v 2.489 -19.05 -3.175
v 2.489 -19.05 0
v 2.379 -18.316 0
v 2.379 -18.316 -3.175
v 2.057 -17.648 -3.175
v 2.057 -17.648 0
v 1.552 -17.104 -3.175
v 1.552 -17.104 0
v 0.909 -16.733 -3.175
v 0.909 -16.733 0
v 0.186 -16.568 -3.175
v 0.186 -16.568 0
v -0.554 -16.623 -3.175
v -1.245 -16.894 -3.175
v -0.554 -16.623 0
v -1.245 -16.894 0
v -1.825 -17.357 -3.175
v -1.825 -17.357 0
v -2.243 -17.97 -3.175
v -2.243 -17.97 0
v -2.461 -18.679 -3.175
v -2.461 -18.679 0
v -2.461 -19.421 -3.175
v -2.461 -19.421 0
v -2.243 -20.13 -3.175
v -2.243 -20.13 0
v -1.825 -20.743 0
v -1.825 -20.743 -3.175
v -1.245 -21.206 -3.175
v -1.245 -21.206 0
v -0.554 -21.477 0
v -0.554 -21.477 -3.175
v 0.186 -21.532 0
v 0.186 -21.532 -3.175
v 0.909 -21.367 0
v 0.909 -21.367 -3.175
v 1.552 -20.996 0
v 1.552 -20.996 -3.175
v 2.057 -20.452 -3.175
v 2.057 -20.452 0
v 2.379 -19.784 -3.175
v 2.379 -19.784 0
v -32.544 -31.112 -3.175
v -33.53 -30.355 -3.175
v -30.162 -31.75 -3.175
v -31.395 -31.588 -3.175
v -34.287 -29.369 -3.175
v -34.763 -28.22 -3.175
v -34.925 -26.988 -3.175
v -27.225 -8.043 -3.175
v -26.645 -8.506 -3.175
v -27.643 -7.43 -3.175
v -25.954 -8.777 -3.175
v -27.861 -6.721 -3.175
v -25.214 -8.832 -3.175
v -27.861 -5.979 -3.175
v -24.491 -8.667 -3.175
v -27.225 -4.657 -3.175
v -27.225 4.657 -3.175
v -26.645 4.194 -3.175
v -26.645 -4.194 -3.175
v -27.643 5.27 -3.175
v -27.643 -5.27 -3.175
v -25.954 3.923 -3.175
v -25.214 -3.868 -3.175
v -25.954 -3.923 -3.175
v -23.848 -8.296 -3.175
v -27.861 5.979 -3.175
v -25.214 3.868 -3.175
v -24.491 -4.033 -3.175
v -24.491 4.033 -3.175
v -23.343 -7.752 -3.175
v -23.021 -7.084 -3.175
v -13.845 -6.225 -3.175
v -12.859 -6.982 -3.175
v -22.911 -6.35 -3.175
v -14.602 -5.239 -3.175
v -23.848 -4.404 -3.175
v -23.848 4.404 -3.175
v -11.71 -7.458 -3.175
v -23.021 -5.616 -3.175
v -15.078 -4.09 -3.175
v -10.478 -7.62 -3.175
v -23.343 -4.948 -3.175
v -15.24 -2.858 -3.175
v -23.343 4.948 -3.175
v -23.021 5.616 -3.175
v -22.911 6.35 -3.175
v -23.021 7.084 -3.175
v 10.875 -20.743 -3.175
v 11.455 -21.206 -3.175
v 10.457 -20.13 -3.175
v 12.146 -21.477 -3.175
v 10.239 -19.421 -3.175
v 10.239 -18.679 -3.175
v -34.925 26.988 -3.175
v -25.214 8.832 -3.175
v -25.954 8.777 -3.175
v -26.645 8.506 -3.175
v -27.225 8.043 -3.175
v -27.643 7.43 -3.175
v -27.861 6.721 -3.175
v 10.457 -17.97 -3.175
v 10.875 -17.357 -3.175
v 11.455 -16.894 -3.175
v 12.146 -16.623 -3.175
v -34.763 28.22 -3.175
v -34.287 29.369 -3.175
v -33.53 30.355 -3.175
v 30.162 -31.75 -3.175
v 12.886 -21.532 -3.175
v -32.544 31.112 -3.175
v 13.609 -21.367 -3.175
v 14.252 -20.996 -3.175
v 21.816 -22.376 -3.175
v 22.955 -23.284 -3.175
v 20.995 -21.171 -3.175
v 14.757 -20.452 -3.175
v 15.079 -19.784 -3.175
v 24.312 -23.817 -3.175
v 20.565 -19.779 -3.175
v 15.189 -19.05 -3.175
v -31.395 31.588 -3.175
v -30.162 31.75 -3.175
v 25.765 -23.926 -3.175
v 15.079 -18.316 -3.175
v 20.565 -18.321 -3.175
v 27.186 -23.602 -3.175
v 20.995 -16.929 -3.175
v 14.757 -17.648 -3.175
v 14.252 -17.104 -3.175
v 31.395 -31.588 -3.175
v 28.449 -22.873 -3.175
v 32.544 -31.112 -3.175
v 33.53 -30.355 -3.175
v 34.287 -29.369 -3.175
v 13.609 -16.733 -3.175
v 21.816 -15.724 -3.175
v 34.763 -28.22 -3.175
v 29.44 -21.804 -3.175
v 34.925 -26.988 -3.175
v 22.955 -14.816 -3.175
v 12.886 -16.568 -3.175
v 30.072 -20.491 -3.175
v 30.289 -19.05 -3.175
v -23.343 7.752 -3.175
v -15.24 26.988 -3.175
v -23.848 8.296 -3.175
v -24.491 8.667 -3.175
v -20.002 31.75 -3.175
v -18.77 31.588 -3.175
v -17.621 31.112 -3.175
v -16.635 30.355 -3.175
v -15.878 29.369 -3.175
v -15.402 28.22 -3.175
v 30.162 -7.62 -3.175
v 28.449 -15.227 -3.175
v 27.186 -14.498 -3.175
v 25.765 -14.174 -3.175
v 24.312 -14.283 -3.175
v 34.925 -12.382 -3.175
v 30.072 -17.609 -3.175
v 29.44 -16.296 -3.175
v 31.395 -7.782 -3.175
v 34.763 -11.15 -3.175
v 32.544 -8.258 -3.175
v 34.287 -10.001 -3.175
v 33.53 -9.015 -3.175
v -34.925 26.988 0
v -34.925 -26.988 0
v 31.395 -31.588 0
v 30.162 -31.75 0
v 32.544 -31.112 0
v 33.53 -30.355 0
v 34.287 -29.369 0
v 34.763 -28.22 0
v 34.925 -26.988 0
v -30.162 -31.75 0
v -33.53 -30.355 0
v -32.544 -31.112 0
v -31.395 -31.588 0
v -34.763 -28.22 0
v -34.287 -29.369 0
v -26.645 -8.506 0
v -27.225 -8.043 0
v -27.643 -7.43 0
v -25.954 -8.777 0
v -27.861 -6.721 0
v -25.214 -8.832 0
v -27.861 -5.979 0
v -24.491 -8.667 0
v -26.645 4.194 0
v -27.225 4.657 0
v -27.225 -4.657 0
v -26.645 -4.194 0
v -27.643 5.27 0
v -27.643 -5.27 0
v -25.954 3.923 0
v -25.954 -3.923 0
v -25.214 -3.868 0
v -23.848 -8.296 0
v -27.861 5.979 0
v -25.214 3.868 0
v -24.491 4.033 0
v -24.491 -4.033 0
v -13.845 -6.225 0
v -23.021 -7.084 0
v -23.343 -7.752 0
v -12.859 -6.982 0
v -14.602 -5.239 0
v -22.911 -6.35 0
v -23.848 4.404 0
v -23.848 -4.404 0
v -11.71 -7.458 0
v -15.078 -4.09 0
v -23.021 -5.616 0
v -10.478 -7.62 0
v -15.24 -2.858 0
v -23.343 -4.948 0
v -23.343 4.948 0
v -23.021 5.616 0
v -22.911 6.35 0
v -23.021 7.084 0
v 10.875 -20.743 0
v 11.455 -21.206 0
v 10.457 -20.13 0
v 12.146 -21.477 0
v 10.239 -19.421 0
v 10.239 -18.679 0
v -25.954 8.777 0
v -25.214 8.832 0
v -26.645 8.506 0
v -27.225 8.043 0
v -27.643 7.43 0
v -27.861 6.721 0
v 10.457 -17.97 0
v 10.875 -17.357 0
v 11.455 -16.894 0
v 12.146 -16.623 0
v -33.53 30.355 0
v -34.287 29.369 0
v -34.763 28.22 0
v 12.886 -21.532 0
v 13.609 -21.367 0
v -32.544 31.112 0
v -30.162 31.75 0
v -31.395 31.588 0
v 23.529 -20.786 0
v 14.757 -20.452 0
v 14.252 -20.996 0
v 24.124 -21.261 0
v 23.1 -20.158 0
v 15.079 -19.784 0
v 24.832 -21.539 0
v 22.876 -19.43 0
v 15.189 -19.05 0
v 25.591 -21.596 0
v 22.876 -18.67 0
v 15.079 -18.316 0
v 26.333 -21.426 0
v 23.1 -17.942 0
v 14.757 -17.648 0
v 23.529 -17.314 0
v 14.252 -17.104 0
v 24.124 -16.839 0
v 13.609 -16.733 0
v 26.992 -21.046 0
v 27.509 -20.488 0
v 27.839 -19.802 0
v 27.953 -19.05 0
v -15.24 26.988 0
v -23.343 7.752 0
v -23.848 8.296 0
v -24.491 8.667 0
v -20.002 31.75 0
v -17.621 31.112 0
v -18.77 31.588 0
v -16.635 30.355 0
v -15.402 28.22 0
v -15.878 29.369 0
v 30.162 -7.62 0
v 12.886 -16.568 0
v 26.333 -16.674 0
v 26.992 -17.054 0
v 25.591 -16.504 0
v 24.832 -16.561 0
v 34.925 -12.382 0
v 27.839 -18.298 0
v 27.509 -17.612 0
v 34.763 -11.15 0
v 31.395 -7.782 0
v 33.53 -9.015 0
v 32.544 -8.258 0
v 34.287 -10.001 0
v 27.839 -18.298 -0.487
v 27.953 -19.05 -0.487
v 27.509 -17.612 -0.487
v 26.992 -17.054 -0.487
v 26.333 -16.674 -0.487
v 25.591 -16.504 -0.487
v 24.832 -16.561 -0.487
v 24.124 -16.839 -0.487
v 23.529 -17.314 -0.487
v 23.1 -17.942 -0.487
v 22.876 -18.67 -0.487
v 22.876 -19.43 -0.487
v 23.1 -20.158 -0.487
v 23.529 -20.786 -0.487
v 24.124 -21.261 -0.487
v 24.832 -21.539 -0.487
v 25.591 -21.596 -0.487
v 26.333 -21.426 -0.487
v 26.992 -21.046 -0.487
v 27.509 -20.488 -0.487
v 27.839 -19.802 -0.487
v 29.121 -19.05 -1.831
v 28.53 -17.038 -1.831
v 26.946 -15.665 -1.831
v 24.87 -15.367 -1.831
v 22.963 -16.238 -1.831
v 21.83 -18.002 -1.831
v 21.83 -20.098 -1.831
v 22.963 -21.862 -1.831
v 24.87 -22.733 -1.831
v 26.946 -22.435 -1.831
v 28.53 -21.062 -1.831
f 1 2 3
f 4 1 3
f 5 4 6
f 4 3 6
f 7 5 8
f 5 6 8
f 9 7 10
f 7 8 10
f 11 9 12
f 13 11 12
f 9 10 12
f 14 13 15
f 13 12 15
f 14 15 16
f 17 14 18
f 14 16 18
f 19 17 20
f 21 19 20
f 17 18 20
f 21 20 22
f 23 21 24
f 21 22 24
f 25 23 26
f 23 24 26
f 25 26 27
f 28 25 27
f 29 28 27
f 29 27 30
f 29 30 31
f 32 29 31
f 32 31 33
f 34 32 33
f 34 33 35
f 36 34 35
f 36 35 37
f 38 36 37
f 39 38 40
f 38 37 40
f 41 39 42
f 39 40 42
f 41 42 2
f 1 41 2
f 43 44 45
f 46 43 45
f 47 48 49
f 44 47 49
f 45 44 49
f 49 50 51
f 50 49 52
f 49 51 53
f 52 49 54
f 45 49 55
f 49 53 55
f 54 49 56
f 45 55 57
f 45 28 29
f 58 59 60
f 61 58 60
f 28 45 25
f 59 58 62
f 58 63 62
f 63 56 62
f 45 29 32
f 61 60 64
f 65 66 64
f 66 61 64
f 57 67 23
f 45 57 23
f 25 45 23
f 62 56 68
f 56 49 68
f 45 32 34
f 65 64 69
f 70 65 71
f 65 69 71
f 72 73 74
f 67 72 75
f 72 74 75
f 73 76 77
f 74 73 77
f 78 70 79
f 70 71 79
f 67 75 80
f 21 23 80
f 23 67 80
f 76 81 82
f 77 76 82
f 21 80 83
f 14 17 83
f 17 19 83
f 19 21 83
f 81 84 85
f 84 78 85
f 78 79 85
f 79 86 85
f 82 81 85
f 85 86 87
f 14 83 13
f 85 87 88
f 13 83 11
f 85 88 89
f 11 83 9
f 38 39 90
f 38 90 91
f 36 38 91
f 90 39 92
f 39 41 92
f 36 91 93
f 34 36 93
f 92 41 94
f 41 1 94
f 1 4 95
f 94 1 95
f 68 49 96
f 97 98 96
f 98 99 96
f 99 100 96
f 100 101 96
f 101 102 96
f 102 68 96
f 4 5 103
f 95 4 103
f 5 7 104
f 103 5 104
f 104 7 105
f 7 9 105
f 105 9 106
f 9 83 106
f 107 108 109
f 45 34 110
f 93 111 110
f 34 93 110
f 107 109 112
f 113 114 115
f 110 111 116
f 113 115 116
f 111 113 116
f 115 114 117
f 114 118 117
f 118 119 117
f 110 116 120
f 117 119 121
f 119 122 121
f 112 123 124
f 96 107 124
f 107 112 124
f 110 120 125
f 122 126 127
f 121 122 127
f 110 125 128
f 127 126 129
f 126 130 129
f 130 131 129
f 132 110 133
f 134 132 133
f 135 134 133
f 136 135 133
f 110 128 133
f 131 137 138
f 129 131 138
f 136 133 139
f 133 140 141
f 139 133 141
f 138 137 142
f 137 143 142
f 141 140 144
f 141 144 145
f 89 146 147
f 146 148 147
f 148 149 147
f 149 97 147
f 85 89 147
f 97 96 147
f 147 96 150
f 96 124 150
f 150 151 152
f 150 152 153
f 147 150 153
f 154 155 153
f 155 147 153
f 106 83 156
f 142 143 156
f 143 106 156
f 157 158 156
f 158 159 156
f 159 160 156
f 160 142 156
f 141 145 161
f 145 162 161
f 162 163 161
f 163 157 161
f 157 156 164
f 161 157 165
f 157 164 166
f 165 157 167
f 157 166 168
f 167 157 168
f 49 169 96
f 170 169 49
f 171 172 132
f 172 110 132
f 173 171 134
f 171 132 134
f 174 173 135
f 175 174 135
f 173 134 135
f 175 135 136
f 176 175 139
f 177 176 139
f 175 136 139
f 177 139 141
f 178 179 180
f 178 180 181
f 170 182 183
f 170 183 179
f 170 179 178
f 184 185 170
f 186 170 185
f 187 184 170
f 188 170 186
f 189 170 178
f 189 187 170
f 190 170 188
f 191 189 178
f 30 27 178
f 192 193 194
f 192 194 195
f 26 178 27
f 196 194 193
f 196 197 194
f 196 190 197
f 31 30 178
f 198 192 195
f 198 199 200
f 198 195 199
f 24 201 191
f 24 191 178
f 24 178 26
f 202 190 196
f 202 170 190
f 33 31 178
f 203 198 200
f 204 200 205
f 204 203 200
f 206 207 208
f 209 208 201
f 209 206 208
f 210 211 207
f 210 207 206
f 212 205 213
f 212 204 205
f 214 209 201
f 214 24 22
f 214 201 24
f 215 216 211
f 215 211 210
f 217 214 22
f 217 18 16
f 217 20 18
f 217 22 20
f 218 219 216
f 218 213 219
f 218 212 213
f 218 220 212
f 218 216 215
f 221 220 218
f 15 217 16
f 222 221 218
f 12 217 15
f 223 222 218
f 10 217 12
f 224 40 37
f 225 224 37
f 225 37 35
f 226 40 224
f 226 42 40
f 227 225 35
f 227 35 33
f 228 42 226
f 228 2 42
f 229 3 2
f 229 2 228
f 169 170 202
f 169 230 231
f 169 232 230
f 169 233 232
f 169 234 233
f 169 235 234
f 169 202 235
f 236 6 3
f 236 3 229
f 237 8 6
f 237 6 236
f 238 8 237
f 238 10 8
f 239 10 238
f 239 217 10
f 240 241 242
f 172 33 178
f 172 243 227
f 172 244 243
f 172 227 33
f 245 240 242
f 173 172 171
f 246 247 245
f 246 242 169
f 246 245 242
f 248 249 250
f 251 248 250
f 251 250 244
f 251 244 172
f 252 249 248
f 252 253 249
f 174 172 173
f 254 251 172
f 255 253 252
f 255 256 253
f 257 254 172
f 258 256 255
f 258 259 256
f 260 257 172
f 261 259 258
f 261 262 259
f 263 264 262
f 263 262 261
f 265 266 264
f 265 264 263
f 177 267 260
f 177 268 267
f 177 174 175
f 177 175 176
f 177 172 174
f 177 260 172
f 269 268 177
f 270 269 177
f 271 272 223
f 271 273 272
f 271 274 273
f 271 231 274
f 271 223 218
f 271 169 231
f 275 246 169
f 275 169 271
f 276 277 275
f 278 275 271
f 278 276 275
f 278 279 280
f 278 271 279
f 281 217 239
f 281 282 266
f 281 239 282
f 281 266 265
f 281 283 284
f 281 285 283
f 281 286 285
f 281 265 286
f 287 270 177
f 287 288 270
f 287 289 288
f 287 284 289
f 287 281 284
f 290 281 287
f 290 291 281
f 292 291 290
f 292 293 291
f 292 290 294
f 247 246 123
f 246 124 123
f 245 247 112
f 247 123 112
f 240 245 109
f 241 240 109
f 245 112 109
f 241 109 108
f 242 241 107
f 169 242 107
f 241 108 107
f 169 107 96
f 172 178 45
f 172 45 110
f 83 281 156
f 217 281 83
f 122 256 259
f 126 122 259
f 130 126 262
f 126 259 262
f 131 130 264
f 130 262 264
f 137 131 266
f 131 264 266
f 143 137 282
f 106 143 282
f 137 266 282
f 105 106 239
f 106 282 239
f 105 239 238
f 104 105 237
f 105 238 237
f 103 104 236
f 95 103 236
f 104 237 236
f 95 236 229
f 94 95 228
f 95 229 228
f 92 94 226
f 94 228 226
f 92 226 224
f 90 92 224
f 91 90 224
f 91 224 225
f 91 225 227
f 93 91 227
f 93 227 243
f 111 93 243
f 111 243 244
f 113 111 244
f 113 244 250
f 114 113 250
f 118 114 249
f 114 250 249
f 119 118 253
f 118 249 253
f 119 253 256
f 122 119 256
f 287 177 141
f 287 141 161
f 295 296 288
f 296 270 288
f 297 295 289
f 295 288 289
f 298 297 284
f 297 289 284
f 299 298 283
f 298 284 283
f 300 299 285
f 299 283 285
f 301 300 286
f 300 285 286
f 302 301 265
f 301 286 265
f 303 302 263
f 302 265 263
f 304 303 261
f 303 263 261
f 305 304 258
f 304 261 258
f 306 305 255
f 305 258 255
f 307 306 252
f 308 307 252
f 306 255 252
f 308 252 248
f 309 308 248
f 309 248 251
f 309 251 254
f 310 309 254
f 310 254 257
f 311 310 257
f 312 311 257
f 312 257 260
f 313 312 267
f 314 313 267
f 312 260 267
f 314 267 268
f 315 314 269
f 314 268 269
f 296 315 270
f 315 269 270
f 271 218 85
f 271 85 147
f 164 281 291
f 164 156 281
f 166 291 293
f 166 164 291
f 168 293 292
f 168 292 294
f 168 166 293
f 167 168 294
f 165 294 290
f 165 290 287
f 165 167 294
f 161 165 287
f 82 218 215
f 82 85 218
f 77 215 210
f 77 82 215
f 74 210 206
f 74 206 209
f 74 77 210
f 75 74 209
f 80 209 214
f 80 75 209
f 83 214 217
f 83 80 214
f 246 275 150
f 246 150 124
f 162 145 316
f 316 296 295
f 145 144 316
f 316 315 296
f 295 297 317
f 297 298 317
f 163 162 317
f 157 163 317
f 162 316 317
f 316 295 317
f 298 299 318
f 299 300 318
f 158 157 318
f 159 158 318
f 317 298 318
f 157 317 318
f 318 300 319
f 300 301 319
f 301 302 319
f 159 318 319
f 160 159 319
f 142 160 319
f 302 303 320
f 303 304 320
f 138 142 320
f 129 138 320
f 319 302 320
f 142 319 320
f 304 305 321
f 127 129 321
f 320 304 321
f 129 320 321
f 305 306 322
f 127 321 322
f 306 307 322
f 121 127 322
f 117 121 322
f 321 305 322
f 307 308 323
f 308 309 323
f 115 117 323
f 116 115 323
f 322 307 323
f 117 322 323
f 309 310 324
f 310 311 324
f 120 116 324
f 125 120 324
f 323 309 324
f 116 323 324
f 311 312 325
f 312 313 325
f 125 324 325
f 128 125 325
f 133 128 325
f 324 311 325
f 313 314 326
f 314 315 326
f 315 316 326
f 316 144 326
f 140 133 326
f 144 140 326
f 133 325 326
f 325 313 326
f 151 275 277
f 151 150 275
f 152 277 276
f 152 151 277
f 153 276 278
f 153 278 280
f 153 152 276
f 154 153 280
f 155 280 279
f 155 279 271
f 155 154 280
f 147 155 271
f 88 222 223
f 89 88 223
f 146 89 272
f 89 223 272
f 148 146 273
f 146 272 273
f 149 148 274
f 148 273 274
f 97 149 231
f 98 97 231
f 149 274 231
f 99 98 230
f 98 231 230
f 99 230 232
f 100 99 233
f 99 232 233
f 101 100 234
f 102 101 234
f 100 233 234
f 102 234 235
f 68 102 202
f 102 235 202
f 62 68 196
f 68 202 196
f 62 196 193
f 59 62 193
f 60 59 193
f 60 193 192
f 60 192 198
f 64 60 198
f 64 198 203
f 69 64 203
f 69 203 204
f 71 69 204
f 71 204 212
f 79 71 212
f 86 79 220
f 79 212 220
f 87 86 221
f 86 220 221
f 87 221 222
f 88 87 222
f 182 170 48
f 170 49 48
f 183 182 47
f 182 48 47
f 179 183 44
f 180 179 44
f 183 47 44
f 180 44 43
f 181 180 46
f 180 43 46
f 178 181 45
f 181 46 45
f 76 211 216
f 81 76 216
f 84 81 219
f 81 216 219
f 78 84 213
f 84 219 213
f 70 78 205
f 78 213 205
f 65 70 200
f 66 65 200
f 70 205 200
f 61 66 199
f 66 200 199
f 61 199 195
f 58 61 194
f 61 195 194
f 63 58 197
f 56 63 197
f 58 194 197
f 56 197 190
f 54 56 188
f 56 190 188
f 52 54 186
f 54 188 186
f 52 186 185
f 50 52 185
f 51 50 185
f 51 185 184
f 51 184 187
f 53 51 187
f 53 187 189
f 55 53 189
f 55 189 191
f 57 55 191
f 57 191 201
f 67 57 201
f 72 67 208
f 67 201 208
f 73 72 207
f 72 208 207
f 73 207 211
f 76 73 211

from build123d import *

# Parameters (mm, degrees)
SKETCH1_R                                       = 2.4892
BASE_FLANGE1_DEPTH                              = 3.175
FILLET2_R                                       = 4.7625
CSK_FOR_10_FLAT_HEAD_MACHINE_SCREW1_D           = 5.1054
CSK_FOR_10_FLAT_HEAD_MACHINE_SCREW1_DEPTH       = 19.05
CSK_FOR_10_FLAT_HEAD_MACHINE_SCREW1_CSINK_D     = 9.779
CSK_FOR_10_FLAT_HEAD_MACHINE_SCREW1_CSINK_ANGLE = 82
CSK_FOR_10_FLAT_HEAD_MACHINE_SCREW1_TIP         = 1.533816902


# Sheet-metal steps are written as plain solids
with BuildPart() as part:
    # Sketch1 → Base-Flange1 (new body)
    with BuildSketch(Plane.XY):
        Polygon((-15.24, 31.75), (-34.925, 31.75), (-34.925, -31.75), (34.925, -31.75), (34.925, -7.62), (-15.24, -7.62), align=None)
        with Locations((-25.4, -6.35)):
            Circle(SKETCH1_R, mode=Mode.SUBTRACT)
        with Locations((-25.4, 6.35)):
            Circle(SKETCH1_R, mode=Mode.SUBTRACT)
        with Locations((0, -19.05)):
            Circle(SKETCH1_R, mode=Mode.SUBTRACT)
        with Locations((12.7, -19.05)):
            Circle(SKETCH1_R, mode=Mode.SUBTRACT)
        with Locations((25.4, -19.05)):
            Circle(SKETCH1_R, mode=Mode.SUBTRACT)
    extrude(amount=-BASE_FLANGE1_DEPTH)

    # Fillet2
    fillet2_edges = [part.edges().sort_by_distance(p)[0] for p in [
        (-34.925, -31.75, -1.5875),
        (34.925, -31.75, -1.5875),
        (34.925, -7.62, -1.5875),
        (-15.24, -7.62, -1.5875),
        (-15.24, 31.75, -1.5875),
        (-34.925, 31.75, -1.5875),
    ]]
    fillet(fillet2_edges, radius=FILLET2_R)

    # CSK for #10 Flat Head Machine Screw1
    with Locations(Plane(origin=(0, 0, -3.175), x_dir=(-1, 0, 0), z_dir=(0, 0, -1))):
        with Locations((-25.4, -19.05)):
            CounterSinkHole(CSK_FOR_10_FLAT_HEAD_MACHINE_SCREW1_D / 2, CSK_FOR_10_FLAT_HEAD_MACHINE_SCREW1_CSINK_D / 2, depth=CSK_FOR_10_FLAT_HEAD_MACHINE_SCREW1_DEPTH, counter_sink_angle=CSK_FOR_10_FLAT_HEAD_MACHINE_SCREW1_CSINK_ANGLE)
            with Locations((0, 0, -(CSK_FOR_10_FLAT_HEAD_MACHINE_SCREW1_DEPTH + CSK_FOR_10_FLAT_HEAD_MACHINE_SCREW1_TIP / 2))):  # 118° drill point
                Cone(0, CSK_FOR_10_FLAT_HEAD_MACHINE_SCREW1_D / 2, CSK_FOR_10_FLAT_HEAD_MACHINE_SCREW1_TIP, mode=Mode.SUBTRACT)


solid = part.part
